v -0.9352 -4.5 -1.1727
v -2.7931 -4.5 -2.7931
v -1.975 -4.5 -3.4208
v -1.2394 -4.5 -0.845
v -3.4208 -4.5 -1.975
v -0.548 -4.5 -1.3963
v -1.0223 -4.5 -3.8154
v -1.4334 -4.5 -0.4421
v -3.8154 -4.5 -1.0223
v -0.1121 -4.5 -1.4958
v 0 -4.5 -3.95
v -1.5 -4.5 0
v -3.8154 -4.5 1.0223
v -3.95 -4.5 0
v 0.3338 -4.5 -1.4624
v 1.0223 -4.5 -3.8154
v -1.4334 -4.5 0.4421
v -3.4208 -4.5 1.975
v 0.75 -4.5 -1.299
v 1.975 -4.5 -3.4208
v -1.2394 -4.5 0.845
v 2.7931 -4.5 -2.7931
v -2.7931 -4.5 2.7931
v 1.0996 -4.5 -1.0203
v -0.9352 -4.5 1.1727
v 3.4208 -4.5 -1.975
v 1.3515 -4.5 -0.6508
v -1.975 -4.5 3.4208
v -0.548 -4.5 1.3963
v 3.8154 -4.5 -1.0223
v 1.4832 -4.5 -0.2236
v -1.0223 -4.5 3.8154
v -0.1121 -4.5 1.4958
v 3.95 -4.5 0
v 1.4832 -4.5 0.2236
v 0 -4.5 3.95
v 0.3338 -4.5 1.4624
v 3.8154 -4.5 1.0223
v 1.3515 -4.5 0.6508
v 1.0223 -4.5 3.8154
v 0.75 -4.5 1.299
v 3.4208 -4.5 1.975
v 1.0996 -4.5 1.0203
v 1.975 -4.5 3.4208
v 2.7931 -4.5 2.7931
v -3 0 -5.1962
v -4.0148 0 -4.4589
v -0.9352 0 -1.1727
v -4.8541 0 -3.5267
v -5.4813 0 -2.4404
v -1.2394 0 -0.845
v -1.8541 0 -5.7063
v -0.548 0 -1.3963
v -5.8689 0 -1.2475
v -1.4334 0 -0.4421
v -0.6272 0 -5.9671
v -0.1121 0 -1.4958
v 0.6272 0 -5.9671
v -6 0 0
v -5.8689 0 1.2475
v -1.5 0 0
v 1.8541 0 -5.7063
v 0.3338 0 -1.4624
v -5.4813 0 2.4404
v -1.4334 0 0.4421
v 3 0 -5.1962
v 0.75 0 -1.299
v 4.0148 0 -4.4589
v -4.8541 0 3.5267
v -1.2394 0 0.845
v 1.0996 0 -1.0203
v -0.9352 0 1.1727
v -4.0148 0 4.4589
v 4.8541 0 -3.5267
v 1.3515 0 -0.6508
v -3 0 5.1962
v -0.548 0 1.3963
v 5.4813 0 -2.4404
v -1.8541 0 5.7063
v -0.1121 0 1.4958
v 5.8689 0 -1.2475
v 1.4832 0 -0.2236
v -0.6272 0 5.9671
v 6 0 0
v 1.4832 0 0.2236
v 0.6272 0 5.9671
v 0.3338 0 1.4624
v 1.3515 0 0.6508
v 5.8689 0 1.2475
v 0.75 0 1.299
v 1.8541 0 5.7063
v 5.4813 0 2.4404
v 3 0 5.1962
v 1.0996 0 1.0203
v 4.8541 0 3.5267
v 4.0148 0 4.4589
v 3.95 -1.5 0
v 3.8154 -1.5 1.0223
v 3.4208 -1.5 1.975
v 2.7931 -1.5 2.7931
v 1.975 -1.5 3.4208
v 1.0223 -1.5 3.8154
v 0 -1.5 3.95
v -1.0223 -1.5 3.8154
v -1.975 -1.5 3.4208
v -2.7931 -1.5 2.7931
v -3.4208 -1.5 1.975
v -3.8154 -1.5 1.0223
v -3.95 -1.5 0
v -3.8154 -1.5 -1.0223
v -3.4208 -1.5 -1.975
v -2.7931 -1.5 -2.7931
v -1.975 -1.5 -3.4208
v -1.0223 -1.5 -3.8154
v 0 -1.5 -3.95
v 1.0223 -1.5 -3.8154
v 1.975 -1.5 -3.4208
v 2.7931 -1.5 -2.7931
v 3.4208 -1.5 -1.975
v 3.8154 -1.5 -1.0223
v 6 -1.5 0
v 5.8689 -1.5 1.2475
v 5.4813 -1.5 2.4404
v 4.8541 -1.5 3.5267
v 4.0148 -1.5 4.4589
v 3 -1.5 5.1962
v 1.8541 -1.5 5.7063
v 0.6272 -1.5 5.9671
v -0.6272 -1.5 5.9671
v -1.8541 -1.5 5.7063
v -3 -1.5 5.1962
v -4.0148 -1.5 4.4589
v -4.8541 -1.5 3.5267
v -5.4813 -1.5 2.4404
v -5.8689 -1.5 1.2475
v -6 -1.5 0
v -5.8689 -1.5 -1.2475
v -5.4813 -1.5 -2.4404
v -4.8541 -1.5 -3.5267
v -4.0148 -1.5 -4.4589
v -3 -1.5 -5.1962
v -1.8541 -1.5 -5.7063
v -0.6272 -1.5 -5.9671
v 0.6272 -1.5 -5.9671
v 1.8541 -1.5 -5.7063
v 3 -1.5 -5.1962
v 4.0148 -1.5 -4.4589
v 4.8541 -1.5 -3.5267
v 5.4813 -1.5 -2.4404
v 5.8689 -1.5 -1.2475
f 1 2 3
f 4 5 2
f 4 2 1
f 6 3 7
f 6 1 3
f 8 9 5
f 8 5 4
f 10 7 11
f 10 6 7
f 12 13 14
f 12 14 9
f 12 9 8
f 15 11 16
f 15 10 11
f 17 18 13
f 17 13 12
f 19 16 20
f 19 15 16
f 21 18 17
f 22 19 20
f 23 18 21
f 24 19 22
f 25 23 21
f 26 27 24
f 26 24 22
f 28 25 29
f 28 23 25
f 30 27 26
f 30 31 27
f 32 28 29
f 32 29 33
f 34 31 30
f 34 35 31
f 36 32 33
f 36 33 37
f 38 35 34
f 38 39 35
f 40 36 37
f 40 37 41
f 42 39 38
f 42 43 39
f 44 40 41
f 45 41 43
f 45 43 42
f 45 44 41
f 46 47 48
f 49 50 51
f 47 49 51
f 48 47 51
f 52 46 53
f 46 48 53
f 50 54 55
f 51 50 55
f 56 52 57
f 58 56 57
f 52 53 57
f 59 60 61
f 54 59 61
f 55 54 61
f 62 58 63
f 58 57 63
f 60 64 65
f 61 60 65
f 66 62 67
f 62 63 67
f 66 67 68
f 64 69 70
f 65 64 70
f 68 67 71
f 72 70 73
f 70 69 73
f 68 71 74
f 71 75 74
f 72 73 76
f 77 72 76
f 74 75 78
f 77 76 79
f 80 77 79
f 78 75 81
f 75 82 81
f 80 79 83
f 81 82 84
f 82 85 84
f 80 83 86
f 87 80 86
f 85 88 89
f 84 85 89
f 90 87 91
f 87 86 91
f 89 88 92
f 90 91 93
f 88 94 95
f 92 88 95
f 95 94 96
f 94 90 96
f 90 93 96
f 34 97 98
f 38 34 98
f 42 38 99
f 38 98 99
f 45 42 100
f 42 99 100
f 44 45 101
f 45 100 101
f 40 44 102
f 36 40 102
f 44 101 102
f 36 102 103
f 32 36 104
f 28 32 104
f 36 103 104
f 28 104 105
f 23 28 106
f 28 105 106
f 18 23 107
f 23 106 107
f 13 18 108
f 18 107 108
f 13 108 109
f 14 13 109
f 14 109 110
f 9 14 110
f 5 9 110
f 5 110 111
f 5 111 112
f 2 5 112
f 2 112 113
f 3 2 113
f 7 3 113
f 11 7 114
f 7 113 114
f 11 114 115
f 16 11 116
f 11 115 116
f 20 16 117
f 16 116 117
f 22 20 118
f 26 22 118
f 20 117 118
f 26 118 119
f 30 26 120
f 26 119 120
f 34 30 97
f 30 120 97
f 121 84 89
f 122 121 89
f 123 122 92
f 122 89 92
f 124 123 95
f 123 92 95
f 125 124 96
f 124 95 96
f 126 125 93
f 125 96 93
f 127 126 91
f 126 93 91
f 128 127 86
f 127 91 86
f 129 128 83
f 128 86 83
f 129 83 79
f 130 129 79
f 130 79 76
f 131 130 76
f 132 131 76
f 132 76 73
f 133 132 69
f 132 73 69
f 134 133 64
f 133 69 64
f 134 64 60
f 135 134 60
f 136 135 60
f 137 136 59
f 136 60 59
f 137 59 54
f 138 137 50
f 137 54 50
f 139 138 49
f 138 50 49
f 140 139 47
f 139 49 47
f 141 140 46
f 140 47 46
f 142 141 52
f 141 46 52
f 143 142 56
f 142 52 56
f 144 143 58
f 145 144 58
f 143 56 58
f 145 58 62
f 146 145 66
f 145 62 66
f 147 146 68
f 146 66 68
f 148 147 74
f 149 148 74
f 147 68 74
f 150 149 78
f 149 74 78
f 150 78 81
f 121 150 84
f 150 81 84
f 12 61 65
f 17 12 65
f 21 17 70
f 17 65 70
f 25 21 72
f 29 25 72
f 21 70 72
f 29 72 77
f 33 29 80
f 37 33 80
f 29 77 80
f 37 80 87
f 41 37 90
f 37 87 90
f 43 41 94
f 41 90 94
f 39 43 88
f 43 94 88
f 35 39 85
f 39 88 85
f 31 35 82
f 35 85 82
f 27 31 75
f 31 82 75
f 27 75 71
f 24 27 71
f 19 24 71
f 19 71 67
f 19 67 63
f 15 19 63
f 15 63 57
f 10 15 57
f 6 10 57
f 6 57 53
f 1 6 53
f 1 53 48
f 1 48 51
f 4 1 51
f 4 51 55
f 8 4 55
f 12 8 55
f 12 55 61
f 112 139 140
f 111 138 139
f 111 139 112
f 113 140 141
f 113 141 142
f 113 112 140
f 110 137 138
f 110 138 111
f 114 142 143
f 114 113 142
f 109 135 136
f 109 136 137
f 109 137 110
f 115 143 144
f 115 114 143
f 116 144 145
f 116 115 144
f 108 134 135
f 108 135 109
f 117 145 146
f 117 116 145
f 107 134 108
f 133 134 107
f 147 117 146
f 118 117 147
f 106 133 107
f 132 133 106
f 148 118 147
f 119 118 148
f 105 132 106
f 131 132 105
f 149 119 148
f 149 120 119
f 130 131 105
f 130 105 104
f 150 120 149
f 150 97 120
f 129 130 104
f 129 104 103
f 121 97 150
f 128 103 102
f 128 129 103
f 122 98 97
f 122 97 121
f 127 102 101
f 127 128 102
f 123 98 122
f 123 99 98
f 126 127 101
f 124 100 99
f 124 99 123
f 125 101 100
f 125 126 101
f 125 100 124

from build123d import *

# Parameters (mm, degrees)
F0_R     = 6
F1_DEPTH = 1.5
F2_R     = 3.95
F3_DEPTH = 3
F5_D     = 3


with BuildPart() as f1:
    # F0 (on Front) → F1 (new body)
    with BuildSketch(Plane.XZ):
        Circle(F0_R)
    extrude(amount=F1_DEPTH)

    # F2 (on face) → F3 (join)
    with BuildSketch(Plane.XZ.offset(1.5)):
        Circle(F2_R)
    extrude(amount=F3_DEPTH)

    # F5 (through all)
    with Locations(Plane.XZ.offset(4.5)):
        with Locations((0, 0)):
            Hole(F5_D / 2)


solid = f1.part
